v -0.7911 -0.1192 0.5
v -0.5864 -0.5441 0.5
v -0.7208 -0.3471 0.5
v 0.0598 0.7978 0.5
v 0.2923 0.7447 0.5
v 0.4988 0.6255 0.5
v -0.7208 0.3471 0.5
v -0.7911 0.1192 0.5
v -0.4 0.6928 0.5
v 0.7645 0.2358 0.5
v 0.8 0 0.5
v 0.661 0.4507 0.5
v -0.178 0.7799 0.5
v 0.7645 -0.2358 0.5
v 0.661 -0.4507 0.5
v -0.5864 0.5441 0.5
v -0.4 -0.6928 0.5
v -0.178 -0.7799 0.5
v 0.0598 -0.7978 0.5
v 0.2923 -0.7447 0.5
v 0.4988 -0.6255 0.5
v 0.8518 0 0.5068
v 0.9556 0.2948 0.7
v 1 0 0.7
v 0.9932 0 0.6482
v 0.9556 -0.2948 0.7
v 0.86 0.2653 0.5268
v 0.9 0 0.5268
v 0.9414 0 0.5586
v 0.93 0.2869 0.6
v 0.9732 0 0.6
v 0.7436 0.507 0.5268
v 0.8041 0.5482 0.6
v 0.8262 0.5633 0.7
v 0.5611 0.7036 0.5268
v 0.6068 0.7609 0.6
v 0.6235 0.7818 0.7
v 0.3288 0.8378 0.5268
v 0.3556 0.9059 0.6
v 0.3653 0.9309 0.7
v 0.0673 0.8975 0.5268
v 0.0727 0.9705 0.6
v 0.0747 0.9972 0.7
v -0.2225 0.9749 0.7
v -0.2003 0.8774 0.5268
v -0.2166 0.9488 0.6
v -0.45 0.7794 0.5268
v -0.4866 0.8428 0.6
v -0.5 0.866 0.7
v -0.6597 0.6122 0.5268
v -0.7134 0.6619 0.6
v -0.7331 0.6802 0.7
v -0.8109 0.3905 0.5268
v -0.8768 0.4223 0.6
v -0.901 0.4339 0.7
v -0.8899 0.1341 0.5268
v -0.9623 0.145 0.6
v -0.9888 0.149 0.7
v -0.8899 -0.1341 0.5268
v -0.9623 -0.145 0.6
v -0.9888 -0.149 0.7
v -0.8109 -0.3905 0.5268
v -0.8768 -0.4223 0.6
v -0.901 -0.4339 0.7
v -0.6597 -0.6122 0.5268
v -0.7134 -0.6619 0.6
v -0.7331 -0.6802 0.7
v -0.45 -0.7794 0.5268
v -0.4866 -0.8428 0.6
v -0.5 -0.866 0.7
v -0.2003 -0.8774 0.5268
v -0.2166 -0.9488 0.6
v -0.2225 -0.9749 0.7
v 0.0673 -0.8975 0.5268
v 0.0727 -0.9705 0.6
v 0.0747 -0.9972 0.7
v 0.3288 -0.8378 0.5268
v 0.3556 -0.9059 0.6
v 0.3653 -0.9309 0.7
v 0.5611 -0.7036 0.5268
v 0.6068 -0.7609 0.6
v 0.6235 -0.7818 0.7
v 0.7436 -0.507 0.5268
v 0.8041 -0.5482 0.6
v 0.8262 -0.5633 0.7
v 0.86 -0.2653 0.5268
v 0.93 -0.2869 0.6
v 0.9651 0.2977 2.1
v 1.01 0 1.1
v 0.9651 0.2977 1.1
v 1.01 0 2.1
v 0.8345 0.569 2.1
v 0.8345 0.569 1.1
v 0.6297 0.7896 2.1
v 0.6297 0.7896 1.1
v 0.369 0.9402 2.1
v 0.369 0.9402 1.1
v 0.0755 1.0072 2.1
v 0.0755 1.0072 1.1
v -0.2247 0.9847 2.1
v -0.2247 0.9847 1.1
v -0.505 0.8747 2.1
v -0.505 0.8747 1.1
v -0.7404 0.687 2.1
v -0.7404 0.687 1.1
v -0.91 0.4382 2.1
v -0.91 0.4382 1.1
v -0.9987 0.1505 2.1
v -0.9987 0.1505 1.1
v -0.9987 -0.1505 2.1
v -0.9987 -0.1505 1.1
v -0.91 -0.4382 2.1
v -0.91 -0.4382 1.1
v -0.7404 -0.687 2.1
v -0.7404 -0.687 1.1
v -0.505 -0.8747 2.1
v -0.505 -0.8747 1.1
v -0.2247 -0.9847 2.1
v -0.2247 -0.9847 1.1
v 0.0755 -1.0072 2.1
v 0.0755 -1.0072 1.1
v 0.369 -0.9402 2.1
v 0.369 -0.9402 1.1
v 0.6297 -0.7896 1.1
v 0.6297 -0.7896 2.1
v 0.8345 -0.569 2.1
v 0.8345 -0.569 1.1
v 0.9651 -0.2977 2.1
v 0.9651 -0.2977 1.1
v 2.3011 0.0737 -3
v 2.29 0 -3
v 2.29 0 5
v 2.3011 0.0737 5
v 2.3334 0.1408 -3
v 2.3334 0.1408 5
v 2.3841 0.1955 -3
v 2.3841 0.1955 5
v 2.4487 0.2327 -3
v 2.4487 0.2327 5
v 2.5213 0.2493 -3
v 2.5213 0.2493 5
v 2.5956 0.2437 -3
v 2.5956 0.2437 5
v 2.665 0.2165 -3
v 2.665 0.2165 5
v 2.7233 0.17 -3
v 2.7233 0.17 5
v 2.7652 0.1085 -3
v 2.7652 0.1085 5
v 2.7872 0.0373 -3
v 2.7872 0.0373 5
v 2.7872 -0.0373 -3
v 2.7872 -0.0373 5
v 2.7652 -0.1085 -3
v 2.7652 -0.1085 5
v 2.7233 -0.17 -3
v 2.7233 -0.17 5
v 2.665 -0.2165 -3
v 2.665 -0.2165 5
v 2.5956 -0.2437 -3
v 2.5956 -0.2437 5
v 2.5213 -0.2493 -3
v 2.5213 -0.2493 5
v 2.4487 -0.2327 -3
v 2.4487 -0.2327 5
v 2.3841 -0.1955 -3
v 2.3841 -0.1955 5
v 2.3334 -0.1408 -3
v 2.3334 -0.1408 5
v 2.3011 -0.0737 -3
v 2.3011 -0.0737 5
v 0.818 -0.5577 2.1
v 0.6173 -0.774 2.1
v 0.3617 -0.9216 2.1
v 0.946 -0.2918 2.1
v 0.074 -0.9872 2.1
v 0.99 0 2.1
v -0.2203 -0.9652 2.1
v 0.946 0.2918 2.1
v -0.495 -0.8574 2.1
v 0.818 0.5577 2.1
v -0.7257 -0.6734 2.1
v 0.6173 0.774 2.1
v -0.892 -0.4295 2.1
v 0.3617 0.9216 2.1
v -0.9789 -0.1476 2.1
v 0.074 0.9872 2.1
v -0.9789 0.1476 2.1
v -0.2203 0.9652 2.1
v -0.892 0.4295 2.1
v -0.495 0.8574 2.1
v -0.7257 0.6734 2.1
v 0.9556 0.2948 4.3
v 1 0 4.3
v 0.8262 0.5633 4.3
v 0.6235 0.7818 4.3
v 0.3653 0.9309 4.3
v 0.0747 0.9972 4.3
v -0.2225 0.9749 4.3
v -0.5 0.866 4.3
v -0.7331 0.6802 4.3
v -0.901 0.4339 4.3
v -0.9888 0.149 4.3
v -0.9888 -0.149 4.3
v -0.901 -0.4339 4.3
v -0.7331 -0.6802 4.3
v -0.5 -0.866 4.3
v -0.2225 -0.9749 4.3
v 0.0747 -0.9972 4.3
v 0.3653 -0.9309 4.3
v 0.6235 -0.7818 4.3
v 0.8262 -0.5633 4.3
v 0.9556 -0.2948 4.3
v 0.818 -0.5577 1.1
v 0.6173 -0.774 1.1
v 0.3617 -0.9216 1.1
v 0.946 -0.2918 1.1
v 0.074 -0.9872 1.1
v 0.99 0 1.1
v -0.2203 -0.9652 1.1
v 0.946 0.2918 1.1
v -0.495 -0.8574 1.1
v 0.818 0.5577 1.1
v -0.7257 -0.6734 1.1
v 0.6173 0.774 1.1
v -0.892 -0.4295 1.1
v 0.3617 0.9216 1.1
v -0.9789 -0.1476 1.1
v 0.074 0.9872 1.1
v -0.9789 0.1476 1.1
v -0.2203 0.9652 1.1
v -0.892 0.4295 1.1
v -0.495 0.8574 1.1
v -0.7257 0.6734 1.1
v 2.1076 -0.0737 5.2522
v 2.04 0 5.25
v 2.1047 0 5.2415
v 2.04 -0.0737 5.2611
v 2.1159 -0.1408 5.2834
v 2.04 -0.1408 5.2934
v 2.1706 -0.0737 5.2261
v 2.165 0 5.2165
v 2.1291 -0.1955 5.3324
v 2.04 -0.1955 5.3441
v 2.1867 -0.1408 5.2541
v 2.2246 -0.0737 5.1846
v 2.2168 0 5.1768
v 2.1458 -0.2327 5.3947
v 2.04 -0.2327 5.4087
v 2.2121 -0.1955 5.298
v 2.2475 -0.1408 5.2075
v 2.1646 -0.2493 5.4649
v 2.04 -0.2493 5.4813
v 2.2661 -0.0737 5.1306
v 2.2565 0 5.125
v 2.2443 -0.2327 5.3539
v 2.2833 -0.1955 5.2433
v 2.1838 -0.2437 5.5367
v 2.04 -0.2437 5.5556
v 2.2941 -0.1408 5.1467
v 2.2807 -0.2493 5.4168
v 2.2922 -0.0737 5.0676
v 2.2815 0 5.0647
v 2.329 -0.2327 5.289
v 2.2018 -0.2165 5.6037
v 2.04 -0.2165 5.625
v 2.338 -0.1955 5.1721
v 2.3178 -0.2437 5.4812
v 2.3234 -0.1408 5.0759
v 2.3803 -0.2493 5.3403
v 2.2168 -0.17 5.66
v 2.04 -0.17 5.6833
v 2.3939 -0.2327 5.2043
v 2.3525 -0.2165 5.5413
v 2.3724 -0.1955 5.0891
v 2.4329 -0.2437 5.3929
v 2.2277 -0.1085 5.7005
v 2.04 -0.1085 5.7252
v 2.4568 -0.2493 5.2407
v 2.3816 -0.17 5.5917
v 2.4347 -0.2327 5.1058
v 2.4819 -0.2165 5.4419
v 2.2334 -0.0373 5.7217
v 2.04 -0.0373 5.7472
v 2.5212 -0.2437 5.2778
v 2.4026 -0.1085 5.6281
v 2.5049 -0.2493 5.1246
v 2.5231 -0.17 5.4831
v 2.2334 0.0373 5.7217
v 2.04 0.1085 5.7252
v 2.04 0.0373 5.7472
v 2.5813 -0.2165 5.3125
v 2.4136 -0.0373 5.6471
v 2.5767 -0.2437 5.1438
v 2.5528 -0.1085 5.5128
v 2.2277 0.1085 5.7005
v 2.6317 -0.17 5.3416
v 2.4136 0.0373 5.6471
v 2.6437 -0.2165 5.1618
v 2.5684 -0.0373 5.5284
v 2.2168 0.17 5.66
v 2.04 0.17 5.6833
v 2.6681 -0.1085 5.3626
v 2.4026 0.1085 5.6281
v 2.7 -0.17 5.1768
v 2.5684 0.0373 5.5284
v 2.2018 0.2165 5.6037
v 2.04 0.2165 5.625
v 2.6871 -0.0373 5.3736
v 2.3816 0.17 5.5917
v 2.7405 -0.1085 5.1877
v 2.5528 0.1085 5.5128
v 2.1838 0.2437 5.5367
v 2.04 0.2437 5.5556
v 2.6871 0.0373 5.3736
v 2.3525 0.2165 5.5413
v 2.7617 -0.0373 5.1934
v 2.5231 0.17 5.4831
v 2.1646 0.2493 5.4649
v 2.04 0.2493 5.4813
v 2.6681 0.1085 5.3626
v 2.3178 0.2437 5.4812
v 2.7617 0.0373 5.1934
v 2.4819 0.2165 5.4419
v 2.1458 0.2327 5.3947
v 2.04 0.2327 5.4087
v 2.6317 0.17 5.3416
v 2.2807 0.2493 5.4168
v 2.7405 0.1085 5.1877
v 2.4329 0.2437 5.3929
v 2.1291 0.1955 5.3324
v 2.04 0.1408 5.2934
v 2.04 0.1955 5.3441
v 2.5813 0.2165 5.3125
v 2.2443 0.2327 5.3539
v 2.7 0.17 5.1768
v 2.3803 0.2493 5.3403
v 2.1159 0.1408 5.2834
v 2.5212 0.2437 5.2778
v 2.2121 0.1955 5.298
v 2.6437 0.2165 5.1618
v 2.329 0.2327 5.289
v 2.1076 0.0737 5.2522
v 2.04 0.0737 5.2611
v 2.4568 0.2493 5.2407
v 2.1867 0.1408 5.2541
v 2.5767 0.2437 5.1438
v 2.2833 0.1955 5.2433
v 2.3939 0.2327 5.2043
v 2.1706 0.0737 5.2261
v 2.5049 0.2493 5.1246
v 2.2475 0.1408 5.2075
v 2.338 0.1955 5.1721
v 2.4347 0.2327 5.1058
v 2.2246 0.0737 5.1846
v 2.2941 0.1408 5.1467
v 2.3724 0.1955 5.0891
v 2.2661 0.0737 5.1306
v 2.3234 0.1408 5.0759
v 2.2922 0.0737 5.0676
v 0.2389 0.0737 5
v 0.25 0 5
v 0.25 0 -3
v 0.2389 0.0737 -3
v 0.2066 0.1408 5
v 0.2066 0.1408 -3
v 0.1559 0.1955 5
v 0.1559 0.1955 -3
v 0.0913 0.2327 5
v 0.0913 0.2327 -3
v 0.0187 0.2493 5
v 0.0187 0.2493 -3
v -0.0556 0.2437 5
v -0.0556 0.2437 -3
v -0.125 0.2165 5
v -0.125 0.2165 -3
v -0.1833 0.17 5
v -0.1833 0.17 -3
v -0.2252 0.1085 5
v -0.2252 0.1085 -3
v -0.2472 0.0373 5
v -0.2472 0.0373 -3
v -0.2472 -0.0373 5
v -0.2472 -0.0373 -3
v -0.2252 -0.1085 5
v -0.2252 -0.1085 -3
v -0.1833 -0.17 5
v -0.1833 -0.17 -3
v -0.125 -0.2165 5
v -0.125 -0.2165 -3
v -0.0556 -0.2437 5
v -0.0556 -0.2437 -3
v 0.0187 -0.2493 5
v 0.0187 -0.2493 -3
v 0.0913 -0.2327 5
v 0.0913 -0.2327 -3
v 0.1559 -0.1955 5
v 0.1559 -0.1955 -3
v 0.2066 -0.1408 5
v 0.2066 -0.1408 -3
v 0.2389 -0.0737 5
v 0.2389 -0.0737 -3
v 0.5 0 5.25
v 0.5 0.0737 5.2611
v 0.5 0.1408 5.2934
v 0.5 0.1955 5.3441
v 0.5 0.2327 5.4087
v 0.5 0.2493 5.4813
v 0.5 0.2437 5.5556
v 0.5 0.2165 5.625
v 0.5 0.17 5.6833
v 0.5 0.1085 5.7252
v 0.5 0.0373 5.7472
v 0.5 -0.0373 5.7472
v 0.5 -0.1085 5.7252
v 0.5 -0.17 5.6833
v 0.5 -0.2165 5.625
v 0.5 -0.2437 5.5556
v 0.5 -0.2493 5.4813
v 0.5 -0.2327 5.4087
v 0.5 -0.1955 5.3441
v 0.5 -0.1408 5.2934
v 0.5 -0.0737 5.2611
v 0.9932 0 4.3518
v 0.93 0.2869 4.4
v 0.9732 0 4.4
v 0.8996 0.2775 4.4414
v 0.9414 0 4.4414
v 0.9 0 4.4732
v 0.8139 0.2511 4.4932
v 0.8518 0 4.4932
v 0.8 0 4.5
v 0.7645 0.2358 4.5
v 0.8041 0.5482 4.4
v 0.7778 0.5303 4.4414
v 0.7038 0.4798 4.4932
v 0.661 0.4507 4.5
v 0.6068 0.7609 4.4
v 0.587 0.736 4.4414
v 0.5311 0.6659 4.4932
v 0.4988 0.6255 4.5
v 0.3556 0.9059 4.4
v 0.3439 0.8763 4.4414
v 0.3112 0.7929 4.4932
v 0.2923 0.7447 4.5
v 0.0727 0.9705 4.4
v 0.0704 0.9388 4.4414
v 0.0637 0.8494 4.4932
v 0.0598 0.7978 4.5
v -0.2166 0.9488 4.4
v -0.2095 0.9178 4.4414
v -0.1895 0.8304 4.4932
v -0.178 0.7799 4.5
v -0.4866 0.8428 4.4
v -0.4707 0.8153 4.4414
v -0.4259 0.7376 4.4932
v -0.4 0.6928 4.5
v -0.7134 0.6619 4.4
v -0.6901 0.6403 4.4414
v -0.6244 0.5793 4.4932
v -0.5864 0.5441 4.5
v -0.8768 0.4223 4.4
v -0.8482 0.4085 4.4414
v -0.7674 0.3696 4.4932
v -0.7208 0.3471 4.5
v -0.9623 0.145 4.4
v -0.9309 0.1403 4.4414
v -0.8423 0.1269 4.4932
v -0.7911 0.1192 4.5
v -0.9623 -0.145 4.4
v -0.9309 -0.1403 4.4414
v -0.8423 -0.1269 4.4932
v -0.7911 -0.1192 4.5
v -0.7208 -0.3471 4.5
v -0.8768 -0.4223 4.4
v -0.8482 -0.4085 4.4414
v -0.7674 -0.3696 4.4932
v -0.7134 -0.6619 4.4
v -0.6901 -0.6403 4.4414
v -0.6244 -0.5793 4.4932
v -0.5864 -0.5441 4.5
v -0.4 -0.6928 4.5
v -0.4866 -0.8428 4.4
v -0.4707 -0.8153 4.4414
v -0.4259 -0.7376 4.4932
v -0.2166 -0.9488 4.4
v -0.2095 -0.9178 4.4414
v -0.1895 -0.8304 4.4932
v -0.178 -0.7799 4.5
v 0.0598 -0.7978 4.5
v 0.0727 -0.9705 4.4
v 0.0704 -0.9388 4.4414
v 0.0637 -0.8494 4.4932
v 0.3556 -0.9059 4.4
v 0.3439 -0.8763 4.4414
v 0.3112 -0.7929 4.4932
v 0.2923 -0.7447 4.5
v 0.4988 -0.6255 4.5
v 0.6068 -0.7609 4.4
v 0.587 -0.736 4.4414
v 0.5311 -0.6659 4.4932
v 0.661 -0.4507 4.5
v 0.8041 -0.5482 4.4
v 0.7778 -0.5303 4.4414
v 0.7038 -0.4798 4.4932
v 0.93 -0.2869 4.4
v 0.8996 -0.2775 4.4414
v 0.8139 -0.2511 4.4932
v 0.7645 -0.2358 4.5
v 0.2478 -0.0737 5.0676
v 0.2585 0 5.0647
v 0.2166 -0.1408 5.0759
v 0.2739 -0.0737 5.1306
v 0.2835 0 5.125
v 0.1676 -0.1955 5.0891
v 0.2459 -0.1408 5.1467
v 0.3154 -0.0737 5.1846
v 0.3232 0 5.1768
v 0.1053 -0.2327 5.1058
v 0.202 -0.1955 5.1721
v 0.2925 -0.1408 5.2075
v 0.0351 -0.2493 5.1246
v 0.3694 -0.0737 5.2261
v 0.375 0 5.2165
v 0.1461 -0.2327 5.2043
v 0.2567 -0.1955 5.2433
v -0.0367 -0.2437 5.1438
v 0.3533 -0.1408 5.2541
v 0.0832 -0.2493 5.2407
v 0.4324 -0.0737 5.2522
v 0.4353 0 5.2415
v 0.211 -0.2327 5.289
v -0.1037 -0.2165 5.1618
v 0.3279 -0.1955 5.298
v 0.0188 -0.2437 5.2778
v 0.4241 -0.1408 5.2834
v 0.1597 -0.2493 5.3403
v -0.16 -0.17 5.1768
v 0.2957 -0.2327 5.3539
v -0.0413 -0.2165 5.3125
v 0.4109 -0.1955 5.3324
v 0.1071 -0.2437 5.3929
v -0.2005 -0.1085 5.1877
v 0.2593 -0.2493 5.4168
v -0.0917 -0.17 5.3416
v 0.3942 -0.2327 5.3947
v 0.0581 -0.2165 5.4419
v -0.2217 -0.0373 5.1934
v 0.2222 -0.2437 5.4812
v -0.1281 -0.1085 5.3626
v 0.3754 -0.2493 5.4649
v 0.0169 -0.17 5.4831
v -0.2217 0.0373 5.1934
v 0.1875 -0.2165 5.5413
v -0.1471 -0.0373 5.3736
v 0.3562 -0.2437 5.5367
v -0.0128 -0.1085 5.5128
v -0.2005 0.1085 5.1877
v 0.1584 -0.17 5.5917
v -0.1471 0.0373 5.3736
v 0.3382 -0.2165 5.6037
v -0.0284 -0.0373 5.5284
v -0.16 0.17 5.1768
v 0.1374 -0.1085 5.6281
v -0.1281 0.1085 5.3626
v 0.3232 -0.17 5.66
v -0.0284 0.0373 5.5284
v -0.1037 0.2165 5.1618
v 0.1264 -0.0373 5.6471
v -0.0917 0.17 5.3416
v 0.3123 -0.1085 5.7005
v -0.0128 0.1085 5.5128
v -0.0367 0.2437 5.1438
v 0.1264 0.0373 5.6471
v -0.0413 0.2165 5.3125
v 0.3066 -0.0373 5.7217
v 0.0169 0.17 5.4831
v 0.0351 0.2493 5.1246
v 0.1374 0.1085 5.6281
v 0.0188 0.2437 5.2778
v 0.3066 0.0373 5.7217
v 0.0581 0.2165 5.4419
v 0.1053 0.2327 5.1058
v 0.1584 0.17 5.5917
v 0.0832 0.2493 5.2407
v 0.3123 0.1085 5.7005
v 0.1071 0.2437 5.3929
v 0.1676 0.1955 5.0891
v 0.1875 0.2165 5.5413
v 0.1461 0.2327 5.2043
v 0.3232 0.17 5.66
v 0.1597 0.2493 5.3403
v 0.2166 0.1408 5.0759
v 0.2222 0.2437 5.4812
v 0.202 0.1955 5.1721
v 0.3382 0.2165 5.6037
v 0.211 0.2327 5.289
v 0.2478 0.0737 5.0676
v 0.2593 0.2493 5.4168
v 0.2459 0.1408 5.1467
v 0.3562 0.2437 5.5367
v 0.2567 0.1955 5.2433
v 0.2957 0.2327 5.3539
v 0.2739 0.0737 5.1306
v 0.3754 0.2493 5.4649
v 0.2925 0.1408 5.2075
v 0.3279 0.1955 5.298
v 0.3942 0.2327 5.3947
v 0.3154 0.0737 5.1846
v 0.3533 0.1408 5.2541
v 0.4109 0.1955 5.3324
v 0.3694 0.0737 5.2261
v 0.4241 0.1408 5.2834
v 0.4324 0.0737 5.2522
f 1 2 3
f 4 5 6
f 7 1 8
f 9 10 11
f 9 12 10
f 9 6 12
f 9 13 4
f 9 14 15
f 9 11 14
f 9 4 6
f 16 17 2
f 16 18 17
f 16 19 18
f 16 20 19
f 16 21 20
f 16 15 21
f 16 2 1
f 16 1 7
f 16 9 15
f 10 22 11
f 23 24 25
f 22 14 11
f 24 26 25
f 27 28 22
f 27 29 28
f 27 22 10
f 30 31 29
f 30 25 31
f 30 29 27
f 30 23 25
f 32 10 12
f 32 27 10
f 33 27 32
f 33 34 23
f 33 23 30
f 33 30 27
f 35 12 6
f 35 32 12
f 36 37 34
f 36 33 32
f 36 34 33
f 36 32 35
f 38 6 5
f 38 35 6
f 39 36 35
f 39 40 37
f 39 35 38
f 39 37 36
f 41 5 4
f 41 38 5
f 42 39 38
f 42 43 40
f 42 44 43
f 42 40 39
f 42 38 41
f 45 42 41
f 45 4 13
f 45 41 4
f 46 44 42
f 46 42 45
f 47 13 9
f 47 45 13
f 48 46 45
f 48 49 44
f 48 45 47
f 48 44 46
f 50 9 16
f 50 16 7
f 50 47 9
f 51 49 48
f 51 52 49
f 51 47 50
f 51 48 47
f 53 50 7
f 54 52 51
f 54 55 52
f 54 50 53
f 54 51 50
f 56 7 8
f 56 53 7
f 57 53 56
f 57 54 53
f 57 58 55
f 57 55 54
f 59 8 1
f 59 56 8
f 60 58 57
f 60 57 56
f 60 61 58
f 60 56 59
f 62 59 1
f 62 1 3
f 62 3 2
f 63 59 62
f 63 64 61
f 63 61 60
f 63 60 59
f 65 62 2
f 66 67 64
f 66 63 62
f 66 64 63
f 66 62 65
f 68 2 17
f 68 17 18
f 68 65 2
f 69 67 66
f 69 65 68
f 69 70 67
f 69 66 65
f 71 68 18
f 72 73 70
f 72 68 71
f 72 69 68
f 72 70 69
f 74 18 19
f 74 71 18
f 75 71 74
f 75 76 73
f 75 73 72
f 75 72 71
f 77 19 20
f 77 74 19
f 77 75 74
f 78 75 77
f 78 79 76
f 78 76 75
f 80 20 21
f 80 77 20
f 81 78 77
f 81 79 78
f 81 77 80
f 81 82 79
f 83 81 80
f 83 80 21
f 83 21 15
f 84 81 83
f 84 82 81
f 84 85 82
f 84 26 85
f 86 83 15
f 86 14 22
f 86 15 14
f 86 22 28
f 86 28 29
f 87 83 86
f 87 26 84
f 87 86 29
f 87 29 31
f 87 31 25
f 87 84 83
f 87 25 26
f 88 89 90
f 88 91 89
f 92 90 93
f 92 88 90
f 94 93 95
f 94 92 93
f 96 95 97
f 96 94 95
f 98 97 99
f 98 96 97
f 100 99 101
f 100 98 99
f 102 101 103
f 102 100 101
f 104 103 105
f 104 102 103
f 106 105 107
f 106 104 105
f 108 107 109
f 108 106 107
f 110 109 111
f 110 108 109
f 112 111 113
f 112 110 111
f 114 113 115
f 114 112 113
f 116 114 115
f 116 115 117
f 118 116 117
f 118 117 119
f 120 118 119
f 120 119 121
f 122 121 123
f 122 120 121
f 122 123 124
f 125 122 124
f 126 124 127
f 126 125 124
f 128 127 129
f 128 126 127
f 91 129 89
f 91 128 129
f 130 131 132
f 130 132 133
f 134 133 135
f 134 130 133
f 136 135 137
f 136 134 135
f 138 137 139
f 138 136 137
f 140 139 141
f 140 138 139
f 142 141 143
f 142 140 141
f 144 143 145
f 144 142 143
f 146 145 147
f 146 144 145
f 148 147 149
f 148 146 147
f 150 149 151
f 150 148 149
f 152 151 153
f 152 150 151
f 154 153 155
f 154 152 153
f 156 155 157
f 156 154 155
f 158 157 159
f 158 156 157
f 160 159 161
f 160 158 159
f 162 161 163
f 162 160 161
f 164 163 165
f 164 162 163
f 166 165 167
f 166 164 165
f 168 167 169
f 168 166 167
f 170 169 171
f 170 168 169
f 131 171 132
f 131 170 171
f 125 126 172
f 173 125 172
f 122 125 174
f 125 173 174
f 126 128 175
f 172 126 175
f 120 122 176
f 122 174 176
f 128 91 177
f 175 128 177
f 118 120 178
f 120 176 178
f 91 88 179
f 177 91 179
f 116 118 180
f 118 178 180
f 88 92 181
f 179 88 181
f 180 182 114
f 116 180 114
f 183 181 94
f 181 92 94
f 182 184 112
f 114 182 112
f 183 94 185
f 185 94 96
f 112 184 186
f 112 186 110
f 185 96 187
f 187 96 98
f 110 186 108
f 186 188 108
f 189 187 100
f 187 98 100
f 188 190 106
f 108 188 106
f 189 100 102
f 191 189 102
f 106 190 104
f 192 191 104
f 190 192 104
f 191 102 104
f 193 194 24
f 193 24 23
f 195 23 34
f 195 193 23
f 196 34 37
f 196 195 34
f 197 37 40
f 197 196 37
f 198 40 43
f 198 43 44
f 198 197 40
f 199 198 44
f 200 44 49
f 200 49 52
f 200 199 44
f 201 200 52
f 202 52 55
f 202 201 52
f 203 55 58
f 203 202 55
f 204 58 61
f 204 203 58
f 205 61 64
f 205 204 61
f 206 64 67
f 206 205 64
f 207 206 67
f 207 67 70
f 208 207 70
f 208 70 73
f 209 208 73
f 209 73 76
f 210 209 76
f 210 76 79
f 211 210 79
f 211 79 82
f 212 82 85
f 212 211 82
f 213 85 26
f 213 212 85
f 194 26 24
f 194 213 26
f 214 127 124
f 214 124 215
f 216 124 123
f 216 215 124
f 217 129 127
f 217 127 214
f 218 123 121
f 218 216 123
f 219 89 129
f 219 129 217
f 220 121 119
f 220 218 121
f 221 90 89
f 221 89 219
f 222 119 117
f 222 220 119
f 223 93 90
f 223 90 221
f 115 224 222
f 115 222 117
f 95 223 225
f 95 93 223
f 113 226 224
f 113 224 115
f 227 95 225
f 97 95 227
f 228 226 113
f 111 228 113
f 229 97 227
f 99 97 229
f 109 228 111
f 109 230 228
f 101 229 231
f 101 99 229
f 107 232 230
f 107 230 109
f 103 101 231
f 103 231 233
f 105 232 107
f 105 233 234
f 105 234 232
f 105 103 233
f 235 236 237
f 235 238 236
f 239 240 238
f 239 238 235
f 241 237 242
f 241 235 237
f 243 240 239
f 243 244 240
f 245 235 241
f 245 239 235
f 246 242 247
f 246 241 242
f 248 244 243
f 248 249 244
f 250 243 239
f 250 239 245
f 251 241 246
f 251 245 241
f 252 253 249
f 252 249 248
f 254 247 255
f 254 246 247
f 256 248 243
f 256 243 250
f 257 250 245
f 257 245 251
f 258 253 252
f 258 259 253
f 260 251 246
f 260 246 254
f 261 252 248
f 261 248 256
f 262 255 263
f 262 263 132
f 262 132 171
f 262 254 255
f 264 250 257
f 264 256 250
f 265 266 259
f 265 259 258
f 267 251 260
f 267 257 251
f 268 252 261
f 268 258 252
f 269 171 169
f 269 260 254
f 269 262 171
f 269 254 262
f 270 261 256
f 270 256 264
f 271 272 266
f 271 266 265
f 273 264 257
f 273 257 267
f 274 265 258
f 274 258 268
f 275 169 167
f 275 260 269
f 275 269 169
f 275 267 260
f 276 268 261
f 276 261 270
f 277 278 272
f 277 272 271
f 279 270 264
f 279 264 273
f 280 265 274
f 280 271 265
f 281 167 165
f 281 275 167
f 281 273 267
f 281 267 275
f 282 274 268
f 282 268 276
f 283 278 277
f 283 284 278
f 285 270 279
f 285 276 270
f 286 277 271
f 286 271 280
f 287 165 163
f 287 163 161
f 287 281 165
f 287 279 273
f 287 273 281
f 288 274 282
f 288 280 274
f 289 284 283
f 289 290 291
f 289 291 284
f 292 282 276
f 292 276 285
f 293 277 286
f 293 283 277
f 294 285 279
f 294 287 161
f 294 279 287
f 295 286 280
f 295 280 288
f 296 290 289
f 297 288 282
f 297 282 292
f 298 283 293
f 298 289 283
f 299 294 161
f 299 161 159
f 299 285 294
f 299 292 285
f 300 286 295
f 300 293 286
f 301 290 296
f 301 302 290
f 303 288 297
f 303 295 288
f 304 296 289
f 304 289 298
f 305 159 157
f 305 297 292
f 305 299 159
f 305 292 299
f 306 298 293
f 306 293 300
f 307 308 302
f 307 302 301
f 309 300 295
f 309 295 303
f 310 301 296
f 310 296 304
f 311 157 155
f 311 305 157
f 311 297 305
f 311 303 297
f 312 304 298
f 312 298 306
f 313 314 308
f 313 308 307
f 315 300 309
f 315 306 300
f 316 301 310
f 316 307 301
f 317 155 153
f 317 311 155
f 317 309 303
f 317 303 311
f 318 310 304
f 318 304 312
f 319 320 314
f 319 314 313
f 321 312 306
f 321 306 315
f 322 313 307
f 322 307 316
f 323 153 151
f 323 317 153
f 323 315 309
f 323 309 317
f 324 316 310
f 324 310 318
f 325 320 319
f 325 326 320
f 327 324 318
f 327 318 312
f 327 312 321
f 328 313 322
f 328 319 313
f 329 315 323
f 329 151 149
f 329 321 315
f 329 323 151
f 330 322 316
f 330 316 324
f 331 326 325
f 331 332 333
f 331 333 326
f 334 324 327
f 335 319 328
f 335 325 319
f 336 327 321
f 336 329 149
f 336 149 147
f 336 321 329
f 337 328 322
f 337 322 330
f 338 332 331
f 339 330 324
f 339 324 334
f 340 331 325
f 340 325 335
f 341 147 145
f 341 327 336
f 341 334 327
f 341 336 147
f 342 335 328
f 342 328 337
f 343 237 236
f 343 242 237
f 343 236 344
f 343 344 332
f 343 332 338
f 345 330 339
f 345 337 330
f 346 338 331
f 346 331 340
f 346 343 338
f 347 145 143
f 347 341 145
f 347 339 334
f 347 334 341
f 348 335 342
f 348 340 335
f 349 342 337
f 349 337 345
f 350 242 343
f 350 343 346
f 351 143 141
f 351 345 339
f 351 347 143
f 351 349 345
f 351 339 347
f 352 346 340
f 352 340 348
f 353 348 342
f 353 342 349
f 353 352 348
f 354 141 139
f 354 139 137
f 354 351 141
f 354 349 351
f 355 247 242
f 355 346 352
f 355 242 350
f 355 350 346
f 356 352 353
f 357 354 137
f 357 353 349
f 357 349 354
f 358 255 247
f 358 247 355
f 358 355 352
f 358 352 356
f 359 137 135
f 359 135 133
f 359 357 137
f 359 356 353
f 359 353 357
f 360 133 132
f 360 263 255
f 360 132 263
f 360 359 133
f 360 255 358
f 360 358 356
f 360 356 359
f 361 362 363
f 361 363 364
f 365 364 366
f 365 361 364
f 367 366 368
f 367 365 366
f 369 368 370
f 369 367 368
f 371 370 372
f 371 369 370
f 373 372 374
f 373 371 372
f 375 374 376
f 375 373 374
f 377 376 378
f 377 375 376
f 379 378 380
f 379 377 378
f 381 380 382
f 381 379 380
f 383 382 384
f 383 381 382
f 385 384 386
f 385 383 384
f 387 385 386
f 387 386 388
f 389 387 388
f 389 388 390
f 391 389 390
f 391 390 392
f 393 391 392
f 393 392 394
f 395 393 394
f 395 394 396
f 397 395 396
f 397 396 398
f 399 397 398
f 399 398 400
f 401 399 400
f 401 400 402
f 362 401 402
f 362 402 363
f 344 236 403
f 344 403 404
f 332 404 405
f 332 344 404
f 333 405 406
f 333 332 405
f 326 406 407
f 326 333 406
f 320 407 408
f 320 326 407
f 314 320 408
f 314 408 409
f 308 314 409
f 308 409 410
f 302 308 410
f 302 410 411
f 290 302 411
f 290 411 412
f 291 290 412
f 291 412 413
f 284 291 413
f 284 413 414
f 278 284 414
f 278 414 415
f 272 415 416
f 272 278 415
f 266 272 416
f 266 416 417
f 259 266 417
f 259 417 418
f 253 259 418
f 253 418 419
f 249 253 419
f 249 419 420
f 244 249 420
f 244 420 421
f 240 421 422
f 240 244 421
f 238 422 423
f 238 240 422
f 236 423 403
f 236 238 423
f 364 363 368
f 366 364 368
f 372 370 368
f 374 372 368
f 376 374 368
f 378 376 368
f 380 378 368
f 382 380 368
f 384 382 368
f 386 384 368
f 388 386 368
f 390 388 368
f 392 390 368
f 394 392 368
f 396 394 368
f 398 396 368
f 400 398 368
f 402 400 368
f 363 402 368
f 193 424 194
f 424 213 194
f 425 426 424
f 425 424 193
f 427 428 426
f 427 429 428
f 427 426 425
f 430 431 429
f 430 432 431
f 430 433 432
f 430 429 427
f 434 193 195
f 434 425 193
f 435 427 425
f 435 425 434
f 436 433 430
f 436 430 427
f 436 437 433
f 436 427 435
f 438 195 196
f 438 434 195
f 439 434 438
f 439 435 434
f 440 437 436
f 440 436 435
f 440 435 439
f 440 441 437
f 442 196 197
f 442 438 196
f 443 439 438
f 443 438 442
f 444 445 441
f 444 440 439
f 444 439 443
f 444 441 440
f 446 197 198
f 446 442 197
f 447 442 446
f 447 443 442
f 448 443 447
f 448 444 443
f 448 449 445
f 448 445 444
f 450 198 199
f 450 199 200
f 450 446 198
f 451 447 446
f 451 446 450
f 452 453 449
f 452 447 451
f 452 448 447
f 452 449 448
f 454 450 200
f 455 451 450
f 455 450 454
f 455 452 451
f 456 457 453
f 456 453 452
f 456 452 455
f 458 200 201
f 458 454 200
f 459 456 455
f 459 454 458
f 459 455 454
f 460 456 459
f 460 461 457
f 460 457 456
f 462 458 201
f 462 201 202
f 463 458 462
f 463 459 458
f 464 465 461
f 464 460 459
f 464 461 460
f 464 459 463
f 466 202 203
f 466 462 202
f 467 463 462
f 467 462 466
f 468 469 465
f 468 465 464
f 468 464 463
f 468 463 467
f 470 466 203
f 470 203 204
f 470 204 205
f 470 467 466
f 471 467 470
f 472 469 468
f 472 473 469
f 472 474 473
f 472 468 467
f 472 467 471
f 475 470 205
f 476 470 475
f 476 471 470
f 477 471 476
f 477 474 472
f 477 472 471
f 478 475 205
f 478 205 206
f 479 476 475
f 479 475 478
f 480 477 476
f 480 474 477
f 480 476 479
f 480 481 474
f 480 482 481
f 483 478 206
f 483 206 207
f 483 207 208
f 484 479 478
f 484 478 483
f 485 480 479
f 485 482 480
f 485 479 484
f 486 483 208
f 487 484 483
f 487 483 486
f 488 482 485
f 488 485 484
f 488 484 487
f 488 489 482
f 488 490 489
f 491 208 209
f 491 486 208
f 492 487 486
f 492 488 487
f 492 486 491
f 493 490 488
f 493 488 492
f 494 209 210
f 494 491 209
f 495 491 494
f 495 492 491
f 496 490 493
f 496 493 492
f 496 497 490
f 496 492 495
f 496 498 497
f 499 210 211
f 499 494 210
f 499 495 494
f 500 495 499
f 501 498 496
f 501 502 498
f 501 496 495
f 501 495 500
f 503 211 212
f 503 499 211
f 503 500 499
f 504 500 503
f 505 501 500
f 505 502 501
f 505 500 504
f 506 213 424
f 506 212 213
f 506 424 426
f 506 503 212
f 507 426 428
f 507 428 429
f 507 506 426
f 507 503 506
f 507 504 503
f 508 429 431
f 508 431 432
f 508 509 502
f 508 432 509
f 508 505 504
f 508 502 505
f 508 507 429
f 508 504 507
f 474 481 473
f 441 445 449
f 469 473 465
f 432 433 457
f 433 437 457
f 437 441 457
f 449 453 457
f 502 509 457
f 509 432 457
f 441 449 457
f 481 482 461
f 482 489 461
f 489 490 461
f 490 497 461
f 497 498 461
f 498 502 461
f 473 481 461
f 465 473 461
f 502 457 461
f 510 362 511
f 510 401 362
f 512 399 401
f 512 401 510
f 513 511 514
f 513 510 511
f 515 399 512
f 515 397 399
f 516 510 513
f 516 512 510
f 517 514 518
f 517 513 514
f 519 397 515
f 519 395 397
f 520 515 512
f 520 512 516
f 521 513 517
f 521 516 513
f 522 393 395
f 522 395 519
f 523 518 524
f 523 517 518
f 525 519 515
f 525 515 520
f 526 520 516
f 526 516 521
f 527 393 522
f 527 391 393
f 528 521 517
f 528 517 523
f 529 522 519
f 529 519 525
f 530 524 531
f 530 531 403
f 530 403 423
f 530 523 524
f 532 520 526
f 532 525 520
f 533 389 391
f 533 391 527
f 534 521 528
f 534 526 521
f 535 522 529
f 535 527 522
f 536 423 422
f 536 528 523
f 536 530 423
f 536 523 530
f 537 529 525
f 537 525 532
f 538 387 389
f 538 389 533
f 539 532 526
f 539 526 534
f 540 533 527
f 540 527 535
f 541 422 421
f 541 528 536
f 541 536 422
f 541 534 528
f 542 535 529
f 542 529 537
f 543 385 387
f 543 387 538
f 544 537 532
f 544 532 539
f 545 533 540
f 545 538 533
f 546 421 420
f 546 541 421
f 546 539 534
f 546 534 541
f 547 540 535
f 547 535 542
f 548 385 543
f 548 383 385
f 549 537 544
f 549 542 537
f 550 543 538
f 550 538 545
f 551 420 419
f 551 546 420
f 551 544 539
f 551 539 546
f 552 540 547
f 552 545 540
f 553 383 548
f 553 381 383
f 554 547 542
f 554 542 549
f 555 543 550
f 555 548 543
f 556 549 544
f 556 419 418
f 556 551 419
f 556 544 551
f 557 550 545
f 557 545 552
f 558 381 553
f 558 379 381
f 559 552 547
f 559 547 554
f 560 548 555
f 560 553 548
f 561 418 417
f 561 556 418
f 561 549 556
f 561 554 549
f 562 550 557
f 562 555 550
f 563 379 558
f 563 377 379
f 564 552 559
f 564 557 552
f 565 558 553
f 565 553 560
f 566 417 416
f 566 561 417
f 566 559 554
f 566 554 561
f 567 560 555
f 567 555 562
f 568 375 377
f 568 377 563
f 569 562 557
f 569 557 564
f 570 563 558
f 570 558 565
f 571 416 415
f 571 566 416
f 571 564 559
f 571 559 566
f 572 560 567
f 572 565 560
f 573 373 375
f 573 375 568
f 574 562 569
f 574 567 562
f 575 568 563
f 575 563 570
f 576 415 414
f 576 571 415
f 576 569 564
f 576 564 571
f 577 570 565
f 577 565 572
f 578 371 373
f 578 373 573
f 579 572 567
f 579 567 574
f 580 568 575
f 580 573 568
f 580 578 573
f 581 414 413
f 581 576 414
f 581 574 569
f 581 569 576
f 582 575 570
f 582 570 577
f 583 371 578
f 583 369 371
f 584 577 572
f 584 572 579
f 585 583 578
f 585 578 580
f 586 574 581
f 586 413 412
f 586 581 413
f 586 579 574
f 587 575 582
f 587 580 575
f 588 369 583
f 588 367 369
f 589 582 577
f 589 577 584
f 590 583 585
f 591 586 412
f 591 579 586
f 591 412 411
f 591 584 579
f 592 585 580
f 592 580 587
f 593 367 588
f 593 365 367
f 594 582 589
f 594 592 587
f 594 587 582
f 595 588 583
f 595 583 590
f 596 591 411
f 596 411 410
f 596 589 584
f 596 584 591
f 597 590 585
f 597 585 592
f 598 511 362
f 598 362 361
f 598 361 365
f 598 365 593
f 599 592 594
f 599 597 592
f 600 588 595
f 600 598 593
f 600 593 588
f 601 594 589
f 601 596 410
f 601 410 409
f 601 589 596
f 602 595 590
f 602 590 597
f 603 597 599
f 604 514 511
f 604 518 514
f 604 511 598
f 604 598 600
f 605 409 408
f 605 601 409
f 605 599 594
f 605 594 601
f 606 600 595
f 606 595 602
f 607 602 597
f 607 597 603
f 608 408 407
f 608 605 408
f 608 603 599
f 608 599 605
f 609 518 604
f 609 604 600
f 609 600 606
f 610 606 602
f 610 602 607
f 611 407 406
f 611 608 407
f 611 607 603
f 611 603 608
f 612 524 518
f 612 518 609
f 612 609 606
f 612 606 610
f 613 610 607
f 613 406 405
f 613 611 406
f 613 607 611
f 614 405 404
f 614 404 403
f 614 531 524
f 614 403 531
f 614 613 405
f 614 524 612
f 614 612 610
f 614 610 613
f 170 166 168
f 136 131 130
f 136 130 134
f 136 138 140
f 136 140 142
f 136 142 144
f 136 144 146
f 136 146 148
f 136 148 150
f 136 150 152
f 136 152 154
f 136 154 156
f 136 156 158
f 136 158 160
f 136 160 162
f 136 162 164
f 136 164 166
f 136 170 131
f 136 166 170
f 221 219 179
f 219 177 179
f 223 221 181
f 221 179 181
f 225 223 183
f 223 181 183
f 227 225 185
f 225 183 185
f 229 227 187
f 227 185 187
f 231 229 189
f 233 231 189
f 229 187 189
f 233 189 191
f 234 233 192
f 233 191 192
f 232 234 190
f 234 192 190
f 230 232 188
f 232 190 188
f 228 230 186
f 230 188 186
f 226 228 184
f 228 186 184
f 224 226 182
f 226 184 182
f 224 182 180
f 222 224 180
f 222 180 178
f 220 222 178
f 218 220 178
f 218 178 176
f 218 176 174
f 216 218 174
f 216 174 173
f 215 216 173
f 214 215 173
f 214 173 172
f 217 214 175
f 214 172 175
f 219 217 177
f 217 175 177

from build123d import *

# Parameters (mm, degrees)
SKETCH001_R = 0.25
SKETCH003_W = 0.02
SKETCH003_H = 1
SKETCH002_W = 1
SKETCH002_H = 4
FILLET_R    = 0.2


with BuildPart() as sweep_body:
    # Sweep: sweep along a path in Sketch
    with BuildLine(Plane.XZ) as sweep_path:
        Line((0, -3), (0, 5))
        ThreePointArc((0, 5), (0.146447, 5.353553), (0.5, 5.5))
        Line((0.5, 5.5), (2.04, 5.5))
        ThreePointArc((2.04, 5.5), (2.393553, 5.353553), (2.54, 5))
        Line((2.54, 5), (2.54, -3))
    # Sketch001 → Sweep (sweep)
    with BuildSketch(Plane.XY):
        Circle(SKETCH001_R)
    sweep(path=sweep_path.line)


with BuildPart() as revolution001:
    # Sketch003 → Revolution001 (revolve)
    with BuildSketch(Plane.XZ):
        with Locations((1, 1.6)):
            Rectangle(SKETCH003_W, SKETCH003_H)
    revolve(axis=Axis((0, 0, 5.9), (0, 0, 1)))


with BuildPart() as fillet_body:
    # Sketch002 → Revolution (revolve)
    with BuildSketch(Plane.XZ):
        with Locations((0.5, 2.5)):
            Rectangle(SKETCH002_W, SKETCH002_H)
    revolve(axis=Axis((0, 0, 0.5), (0, 0, 1)))

    # Fillet
    fillet_edges = [fillet_body.edges().sort_by_distance(p)[0] for p in [
        (-1, 0, 4.5),
        (-1, 0, 0.5),
    ]]
    fillet(fillet_edges, radius=FILLET_R)


solid = Compound([sweep_body.part, revolution001.part, fillet_body.part])
